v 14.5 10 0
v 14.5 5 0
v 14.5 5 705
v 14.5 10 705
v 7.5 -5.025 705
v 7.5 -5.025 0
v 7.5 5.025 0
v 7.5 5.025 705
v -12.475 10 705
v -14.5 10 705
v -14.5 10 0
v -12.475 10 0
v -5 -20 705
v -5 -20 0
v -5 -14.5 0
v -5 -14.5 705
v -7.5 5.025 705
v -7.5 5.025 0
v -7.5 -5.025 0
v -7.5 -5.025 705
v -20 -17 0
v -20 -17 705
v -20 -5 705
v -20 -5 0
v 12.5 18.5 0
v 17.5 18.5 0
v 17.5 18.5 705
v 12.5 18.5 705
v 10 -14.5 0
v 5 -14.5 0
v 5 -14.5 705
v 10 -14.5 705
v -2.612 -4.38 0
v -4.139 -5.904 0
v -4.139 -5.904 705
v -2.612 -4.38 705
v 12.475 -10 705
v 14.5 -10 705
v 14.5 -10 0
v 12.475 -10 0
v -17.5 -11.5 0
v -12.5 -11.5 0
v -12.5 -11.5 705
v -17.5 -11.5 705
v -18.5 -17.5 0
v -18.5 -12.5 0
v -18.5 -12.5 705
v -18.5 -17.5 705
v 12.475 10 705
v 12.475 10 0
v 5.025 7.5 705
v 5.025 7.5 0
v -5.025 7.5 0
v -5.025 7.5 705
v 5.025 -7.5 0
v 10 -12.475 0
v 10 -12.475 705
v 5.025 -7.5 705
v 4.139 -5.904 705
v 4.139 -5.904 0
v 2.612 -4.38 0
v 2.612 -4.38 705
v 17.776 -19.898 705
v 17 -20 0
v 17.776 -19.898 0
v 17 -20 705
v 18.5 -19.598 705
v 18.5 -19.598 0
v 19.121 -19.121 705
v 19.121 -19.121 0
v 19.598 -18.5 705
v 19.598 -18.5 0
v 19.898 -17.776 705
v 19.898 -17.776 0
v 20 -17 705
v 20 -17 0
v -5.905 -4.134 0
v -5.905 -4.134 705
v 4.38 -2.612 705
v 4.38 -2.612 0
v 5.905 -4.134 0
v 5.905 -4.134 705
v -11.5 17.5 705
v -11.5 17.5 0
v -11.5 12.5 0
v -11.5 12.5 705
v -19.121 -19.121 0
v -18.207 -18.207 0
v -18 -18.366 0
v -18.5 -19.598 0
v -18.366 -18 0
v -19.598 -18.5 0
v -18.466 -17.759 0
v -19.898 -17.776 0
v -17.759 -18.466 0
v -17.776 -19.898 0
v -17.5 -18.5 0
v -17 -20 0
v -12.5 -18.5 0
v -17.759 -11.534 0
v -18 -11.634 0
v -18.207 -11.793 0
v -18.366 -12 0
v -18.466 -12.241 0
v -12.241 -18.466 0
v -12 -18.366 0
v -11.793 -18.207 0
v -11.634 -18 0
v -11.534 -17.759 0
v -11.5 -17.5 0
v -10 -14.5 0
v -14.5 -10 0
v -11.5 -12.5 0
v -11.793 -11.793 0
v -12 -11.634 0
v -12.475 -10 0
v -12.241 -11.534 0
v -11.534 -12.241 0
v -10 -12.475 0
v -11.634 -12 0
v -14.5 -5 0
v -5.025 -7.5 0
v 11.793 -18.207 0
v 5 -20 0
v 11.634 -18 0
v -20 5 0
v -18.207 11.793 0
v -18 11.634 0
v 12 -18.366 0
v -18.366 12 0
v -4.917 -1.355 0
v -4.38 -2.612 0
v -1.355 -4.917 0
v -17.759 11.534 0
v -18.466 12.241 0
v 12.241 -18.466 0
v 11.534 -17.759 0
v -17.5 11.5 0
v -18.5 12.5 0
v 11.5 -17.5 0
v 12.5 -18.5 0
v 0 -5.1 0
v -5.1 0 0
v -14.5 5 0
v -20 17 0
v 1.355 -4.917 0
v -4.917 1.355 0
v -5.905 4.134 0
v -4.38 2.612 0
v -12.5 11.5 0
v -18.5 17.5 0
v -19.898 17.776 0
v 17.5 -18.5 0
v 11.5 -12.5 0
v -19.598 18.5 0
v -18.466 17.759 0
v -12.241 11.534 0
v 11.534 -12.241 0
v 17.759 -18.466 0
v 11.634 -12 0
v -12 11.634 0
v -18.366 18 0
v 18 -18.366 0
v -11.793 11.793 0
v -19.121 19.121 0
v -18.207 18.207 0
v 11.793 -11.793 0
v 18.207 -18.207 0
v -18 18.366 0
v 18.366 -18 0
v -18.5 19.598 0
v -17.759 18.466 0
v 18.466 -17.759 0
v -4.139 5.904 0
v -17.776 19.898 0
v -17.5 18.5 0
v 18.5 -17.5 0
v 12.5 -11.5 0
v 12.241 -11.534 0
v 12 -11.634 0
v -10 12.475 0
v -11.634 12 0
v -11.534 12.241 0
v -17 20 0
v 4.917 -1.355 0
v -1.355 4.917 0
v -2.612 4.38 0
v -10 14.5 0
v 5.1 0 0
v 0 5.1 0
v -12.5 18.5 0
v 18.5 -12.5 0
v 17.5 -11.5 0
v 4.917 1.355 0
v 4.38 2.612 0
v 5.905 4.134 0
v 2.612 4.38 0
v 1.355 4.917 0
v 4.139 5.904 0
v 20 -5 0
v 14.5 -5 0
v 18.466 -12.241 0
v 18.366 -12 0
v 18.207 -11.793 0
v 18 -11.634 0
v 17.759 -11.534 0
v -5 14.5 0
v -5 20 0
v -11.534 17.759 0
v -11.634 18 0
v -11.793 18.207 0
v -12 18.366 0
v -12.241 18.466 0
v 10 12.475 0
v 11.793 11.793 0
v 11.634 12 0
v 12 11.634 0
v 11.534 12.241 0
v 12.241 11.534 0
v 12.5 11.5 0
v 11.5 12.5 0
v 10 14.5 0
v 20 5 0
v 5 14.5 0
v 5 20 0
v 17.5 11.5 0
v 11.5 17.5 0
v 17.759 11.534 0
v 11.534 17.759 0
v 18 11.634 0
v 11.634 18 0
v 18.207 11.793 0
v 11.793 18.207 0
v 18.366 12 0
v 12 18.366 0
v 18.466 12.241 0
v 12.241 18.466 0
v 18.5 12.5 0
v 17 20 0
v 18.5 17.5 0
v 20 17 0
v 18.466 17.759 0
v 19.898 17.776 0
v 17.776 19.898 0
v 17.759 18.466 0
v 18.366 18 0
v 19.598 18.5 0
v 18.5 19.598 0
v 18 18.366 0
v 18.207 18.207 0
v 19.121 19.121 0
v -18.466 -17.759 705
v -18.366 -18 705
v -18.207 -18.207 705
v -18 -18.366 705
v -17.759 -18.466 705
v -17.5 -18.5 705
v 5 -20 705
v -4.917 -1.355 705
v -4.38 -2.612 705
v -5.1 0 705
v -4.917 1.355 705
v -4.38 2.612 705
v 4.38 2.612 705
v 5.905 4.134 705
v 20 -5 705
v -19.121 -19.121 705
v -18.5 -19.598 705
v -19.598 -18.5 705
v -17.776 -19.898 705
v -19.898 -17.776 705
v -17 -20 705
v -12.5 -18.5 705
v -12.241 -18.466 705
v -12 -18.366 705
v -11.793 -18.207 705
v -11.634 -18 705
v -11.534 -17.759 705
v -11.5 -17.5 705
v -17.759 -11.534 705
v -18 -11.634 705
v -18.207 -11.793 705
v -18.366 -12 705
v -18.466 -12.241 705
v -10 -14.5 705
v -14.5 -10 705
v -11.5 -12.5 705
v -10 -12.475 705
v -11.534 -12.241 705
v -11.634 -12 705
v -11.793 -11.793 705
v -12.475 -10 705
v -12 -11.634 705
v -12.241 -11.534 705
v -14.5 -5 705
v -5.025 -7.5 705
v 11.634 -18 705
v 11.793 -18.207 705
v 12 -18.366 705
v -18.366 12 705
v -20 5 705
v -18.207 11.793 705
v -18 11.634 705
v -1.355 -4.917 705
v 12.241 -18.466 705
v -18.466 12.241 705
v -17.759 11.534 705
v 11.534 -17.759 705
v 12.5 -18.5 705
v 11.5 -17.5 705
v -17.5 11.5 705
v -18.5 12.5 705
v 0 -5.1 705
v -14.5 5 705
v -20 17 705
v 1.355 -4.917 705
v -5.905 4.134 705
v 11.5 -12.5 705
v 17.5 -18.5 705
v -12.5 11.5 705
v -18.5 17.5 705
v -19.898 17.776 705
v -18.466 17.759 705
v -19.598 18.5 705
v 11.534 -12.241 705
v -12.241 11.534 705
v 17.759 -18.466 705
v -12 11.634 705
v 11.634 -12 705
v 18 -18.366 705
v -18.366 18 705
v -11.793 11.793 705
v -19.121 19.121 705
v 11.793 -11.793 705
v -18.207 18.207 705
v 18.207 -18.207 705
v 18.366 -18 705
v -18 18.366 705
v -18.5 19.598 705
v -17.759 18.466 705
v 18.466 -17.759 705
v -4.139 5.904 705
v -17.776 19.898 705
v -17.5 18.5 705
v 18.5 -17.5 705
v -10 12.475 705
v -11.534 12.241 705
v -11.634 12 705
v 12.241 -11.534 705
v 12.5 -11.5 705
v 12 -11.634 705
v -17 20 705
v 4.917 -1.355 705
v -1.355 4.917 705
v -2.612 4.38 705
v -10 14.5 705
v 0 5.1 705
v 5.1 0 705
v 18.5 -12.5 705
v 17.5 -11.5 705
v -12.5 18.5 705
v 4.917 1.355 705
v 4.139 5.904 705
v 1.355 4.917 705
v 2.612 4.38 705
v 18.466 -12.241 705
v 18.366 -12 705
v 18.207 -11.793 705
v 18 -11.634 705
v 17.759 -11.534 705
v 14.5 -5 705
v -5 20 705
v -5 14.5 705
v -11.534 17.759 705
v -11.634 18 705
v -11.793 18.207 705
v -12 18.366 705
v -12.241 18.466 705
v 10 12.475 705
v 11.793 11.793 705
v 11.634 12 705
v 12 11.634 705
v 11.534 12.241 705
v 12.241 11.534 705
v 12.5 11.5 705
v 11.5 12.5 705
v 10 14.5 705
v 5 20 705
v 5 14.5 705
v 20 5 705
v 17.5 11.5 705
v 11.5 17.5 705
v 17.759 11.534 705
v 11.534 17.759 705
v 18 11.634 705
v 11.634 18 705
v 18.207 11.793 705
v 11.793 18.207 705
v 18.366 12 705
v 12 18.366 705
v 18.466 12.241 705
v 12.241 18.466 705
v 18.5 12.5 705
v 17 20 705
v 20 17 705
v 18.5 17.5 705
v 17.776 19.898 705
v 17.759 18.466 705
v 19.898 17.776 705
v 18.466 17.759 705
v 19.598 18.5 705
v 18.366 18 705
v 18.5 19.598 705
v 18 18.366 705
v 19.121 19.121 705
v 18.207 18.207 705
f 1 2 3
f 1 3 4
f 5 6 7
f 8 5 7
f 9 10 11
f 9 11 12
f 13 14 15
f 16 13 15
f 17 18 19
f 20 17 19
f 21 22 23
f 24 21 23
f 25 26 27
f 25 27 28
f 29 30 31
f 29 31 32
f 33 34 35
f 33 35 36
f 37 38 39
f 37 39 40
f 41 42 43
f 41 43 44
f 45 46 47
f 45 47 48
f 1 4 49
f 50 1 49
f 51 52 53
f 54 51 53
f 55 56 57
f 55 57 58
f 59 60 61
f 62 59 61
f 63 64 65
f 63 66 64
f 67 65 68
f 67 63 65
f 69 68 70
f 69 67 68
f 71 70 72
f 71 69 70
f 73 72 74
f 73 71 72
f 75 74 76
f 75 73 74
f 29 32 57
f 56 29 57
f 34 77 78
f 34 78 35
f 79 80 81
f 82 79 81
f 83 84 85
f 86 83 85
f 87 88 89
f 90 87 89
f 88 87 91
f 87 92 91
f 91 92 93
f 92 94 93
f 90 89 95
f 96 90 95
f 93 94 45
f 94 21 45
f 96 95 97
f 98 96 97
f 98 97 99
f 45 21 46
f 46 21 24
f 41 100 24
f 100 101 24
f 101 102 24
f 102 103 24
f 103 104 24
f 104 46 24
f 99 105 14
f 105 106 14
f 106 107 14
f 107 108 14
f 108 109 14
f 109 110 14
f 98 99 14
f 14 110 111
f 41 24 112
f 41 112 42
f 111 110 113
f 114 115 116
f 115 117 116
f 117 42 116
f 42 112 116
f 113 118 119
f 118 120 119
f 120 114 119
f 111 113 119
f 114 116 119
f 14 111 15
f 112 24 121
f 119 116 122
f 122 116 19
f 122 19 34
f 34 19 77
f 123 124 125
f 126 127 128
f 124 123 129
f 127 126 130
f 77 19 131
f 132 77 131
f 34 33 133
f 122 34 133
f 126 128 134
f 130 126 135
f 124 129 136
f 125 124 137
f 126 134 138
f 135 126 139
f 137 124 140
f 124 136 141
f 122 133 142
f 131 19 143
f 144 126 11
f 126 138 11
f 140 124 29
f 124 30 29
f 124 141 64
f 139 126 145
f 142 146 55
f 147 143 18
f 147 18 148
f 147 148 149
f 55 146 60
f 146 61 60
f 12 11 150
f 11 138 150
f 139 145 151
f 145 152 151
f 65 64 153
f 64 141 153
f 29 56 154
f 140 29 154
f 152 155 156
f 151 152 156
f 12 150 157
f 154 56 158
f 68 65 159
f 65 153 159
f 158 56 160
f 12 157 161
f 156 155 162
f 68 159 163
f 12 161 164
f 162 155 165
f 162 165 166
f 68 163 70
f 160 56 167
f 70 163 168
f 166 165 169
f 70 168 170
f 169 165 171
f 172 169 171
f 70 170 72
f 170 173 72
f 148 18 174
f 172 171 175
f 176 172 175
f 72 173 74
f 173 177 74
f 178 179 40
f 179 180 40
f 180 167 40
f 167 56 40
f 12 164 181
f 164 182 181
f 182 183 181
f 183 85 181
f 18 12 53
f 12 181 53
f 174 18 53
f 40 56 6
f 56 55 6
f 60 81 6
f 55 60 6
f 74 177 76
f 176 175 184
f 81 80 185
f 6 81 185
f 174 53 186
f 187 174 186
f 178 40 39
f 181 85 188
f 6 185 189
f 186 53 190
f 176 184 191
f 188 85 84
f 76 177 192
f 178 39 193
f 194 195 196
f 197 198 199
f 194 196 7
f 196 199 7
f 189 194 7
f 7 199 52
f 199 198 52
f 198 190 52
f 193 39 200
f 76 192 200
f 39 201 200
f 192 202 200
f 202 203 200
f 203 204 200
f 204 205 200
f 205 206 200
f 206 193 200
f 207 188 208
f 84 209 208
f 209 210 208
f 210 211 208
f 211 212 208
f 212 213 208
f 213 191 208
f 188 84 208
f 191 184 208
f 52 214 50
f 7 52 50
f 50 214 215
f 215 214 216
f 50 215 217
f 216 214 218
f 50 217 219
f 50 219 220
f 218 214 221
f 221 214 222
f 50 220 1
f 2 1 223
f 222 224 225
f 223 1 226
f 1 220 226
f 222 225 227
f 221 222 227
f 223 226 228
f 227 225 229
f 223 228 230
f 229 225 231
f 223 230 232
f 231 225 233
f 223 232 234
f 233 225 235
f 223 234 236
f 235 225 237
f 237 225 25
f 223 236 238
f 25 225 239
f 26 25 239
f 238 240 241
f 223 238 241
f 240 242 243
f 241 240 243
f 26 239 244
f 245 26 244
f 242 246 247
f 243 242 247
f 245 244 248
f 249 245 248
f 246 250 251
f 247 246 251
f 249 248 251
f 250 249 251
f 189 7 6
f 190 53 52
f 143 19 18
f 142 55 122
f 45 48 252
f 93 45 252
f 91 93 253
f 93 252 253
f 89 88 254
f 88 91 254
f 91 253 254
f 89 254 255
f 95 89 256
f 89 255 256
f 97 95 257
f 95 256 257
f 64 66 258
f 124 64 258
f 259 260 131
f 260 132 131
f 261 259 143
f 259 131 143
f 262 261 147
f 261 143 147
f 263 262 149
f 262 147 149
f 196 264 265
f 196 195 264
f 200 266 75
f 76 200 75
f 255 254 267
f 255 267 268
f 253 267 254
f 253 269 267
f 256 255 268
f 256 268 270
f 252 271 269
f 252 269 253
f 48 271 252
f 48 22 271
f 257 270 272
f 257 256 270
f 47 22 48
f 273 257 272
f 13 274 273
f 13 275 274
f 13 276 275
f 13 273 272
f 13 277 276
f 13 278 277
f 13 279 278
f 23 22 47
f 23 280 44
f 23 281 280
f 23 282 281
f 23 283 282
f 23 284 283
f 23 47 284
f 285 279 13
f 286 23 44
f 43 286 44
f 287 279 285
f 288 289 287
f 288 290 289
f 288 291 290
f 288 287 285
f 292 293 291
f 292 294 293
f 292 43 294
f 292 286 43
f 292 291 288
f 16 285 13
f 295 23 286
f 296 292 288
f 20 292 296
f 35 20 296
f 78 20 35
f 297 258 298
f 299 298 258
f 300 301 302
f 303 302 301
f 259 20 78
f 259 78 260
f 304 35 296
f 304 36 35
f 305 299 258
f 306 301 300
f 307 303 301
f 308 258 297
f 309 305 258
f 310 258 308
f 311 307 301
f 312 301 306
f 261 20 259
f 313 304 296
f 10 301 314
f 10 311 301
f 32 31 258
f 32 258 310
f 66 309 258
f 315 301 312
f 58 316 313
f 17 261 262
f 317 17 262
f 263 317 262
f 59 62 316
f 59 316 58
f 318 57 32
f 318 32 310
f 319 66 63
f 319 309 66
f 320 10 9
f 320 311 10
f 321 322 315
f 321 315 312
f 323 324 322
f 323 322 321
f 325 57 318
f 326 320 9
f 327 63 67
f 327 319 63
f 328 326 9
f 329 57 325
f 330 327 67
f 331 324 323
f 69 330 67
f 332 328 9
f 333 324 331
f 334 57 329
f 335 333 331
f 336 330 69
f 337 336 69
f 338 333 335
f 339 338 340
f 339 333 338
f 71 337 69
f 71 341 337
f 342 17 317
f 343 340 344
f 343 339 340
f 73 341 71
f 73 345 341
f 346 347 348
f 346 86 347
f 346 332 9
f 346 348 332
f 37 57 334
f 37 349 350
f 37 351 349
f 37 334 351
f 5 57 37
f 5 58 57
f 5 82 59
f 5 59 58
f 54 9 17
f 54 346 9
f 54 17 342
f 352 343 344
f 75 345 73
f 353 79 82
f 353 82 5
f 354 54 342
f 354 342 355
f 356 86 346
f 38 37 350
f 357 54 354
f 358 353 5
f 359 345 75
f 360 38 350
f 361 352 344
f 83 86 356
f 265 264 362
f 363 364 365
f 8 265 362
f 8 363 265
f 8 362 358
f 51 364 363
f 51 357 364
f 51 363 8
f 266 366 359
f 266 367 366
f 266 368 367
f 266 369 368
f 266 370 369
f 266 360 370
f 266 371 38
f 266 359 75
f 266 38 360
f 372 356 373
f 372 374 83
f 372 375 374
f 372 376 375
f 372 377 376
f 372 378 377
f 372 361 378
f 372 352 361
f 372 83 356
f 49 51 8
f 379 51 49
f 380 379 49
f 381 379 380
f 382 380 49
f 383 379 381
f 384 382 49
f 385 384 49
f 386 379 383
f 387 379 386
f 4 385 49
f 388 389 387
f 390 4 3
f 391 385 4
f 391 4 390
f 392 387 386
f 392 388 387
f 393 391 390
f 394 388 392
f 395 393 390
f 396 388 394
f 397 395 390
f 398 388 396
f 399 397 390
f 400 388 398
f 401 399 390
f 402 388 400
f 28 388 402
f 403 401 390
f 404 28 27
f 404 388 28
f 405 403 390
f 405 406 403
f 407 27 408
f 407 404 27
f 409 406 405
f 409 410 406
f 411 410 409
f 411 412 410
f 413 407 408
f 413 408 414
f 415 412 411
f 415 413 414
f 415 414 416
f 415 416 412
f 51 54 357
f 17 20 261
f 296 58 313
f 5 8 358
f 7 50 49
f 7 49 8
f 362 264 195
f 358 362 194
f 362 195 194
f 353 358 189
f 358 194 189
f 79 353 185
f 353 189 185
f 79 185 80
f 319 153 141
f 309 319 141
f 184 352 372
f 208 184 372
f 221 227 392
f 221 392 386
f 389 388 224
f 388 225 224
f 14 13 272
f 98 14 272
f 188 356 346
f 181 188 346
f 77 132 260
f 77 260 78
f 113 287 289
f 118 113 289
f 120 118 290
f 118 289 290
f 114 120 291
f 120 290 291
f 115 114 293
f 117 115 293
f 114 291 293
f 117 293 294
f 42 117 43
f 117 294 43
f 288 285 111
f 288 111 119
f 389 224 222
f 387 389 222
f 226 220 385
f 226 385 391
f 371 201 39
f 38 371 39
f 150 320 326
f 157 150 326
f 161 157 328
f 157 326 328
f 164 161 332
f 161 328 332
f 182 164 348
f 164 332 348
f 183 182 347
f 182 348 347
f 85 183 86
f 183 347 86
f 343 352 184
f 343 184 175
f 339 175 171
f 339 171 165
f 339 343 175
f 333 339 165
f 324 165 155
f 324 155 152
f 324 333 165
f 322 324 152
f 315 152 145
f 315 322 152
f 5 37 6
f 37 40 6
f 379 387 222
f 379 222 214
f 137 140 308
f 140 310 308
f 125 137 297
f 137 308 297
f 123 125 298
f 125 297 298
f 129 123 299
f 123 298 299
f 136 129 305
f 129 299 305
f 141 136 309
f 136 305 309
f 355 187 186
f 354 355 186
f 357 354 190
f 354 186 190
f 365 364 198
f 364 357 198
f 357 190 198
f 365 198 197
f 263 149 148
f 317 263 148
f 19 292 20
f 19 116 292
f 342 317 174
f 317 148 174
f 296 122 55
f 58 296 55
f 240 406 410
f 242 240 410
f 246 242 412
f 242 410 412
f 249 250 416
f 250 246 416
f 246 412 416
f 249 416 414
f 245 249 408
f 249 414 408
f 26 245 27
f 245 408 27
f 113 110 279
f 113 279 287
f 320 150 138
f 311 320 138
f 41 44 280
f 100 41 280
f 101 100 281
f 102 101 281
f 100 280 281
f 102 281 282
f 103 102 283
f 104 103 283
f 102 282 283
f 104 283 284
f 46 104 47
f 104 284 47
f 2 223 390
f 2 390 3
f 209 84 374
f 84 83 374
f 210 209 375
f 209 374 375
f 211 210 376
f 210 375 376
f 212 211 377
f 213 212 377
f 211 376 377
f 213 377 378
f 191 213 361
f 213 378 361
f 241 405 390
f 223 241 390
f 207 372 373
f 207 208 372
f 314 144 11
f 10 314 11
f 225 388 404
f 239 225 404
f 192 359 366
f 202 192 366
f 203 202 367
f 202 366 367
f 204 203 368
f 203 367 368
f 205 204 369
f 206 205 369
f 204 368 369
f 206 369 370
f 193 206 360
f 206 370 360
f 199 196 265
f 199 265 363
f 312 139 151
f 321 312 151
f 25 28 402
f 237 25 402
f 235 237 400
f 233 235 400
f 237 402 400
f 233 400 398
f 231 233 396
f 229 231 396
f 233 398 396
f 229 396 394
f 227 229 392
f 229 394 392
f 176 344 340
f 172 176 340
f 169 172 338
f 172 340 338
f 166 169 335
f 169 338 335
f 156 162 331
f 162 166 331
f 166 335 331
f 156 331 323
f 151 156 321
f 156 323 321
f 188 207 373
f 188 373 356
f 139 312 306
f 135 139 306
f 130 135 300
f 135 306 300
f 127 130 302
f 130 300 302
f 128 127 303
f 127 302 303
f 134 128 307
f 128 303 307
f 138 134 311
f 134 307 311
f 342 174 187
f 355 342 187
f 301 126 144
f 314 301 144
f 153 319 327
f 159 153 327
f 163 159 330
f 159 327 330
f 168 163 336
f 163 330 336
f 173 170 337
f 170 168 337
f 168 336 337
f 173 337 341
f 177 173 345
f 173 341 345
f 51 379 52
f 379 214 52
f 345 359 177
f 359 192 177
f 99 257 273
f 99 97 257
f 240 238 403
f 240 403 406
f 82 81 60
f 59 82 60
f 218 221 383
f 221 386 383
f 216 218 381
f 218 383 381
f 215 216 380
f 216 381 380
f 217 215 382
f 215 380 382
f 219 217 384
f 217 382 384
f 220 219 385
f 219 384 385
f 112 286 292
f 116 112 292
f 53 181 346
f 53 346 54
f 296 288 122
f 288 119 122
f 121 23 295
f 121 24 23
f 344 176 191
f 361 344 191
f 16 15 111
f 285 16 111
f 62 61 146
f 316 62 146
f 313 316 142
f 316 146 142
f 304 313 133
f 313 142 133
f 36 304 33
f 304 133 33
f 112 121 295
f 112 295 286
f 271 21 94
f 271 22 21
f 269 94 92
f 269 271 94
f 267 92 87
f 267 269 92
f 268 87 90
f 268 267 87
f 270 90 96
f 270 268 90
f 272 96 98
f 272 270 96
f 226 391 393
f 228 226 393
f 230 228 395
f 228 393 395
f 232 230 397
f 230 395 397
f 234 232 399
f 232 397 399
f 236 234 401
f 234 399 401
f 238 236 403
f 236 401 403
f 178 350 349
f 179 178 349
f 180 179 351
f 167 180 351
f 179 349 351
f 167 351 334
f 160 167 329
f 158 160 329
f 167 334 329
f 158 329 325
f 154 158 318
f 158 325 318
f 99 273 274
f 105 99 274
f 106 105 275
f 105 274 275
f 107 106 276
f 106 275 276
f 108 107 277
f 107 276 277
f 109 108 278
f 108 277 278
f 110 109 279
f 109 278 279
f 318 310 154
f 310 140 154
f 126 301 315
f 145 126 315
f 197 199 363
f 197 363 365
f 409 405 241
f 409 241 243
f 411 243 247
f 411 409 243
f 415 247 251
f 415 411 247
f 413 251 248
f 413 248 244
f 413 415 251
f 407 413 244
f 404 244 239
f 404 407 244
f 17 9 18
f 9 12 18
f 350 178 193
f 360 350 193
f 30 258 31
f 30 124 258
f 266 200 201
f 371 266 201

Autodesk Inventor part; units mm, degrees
ref_plane "YZ Plane" through (0, 0, 0) normal (1, 0, 0) x (0, 1, 0)
ref_plane "XZ Plane" through (0, 0, 0) normal (0, 1, 0) x (-1, 0, 0)
ref_plane "XY Plane" through (0, 0, 0) normal (0, 0, 1) x (1, 0, 0)
sketch "T-Slot 4040 Base" plane through (0, 0, 0) normal (0, 0, 1) x (1, 0, 0)
  line L0 (-28, 0) -> (28, 0) construction
  line L1 (0, -28) -> (0, 28) construction
  circle A0 centre (0, 0) radius 5.1
  line L2 (-7.5, -7.5) -> (7.5, -7.5)
  line L3 (7.5, -7.5) -> (7.5, 7.5)
  line L4 (7.5, 7.5) -> (-7.5, 7.5)
  line L5 (-7.5, 7.5) -> (-7.5, -7.5)
  line L6 (-7.5, -7.5) -> (7.5, 7.5) construction
  line L7 (7.5, -7.5) -> (-7.5, 7.5) construction
  line L8 (-20, 20) -> (20, 20)
  line L9 (20, 20) -> (20, -20)
  line L10 (20, -20) -> (-20, -20)
  line L11 (-20, -20) -> (-20, 20)
  line L12 (-20, 20) -> (20, -20) construction
  line L13 (20, 20) -> (-20, -20) construction
  line L14 (20, 5) -> (14.5, 5)
  line L15 (14.5, 5) -> (14.5, 10)
  line L16 (14.5, 10) -> (12.4749, 10)
  line L17 (12.4749, 10) -> (7.5, 5.0251)
  line L18 (5, 20) -> (5, 14.5)
  line L19 (5, 14.5) -> (10, 14.5)
  line L20 (10, 14.5) -> (10, 12.4749)
  line L21 (10, 12.4749) -> (5.0251, 7.5)
  line L22 (18.5, 18.5) -> (11.5, 18.5)
  line L23 (11.5, 18.5) -> (11.5, 11.5)
  line L24 (11.5, 11.5) -> (18.5, 11.5)
  line L25 (18.5, 11.5) -> (18.5, 18.5)
  line L26 (18.5, 18.5) -> (11.5, 11.5) construction
  line L27 (11.5, 18.5) -> (18.5, 11.5) construction
  line L28 (3.0732, 1.3088) -> (4.38, 2.6125) construction
  line L29 (5.905, 4.1338) -> (4.1393, 5.9037)
  line L30 (4.1393, 5.9037) -> (2.6122, 4.3802)
  line L31 (1.3075, 3.0787) -> (3.0732, 1.3088) construction
  line L32 (3.0732, 1.3088) -> (4.1393, 5.9037) construction
  line L33 (5.905, 4.1338) -> (1.3075, 3.0787) construction
  line L34 (4.38, 2.6125) -> (5.905, 4.1338)
  line L35 (2.6122, 4.3802) -> (1.3075, 3.0787) construction
  line L36 (-20, 5) -> (-14.5, 5)
  line L37 (-14.5, 5) -> (-14.5, 10)
  line L38 (-14.5, 10) -> (-12.4749, 10)
  line L39 (-12.4749, 10) -> (-7.5, 5.0251)
  line L40 (-5, 20) -> (-5, 14.5)
  line L41 (-5, 14.5) -> (-10, 14.5)
  line L42 (-10, 14.5) -> (-10, 12.4749)
  line L43 (-10, 12.4749) -> (-5.0251, 7.5)
  line L44 (-18.5, 18.5) -> (-11.5, 18.5)
  line L45 (-11.5, 18.5) -> (-11.5, 11.5)
  line L46 (-11.5, 11.5) -> (-18.5, 11.5)
  line L47 (-18.5, 11.5) -> (-18.5, 18.5)
  line L48 (-5.905, 4.1338) -> (-4.1393, 5.9037)
  line L49 (-4.1393, 5.9037) -> (-2.6122, 4.3802)
  line L50 (-4.38, 2.6125) -> (-5.905, 4.1338)
  line L51 (7.5, -7.5) -> (-7.5, -7.5)
  line L52 (20, -5) -> (14.5, -5)
  line L53 (14.5, -5) -> (14.5, -10)
  line L54 (14.5, -10) -> (12.4749, -10)
  line L55 (12.4749, -10) -> (7.5, -5.0251)
  line L56 (5, -20) -> (5, -14.5)
  line L57 (5, -14.5) -> (10, -14.5)
  line L58 (10, -14.5) -> (10, -12.4749)
  line L59 (10, -12.4749) -> (5.0251, -7.5)
  line L60 (18.5, -18.5) -> (11.5, -18.5)
  line L61 (11.5, -18.5) -> (11.5, -11.5)
  line L62 (11.5, -11.5) -> (18.5, -11.5)
  line L63 (18.5, -11.5) -> (18.5, -18.5)
  line L64 (18.5, -18.5) -> (11.5, -11.5) construction
  line L65 (11.5, -18.5) -> (18.5, -11.5) construction
  line L66 (3.0732, -1.3088) -> (4.38, -2.6125) construction
  line L67 (5.905, -4.1338) -> (4.1393, -5.9037)
  line L68 (4.1393, -5.9037) -> (2.6122, -4.3802)
  line L69 (1.3075, -3.0787) -> (3.0732, -1.3088) construction
  line L70 (3.0732, -1.3088) -> (4.1393, -5.9037) construction
  line L71 (5.905, -4.1338) -> (1.3075, -3.0787) construction
  line L72 (4.38, -2.6125) -> (5.905, -4.1338)
  line L73 (2.6122, -4.3802) -> (1.3075, -3.0787) construction
  line L74 (-4.38, -2.6125) -> (-5.905, -4.1338)
  line L75 (-4.1393, -5.9037) -> (-2.6122, -4.3802)
  line L76 (-5.905, -4.1338) -> (-4.1393, -5.9037)
  line L77 (-12.4749, -10) -> (-7.5, -5.0251)
  line L78 (-10, -12.4749) -> (-5.0251, -7.5)
  line L79 (-10, -14.5) -> (-10, -12.4749)
  line L80 (-5, -14.5) -> (-10, -14.5)
  line L81 (-5, -20) -> (-5, -14.5)
  line L82 (-18.5, -18.5) -> (-11.5, -18.5)
  line L83 (-11.5, -18.5) -> (-11.5, -11.5)
  line L84 (-11.5, -11.5) -> (-18.5, -11.5)
  line L85 (-18.5, -11.5) -> (-18.5, -18.5)
  line L86 (-14.5, -10) -> (-12.4749, -10)
  line L87 (-14.5, -5) -> (-14.5, -10)
  line L88 (-20, -5) -> (-14.5, -5)
  point P0 (15, 15)
  point P1 (3.6062, 3.6062)
  point P2 (3.6062, 3.6062)
  point P3 (15, -15)
  point P4 (3.6062, -3.6062)
  point P5 (3.6062, -3.6062)
  dimension "d9" = 10.2
  dimension "d12" = 40
  dimension "d13" = 40
  dimension "d14" = 5.5
  dimension "d15" = 15
  dimension "d16" = 7
  dimension "d17" = 10
  dimension "d20" = 1.75
  dimension "d21" = 7
  dimension "d22" = 2
  dimension "d29" = 1.5
  dimension "d30" = 2.5
extrude "Extrusion1" add sketch "T-Slot 4040 Base" along normal blind 705 contours L5 L4 L3 L2 | L2 L78 L79 L80 L81 L10 L11 L88 L87 L86 L77 L5 | L2 L3 L55 L54 L53 L52 L9 L10 L56 L57 L58 L59 | L39 L38 L37 L36 L11 L8 L40 L41 L42 L43 L4 L5 | L3 L4 L21 L20 L19 L18 L8 L9 L14 L15 L16 L17
fillet "Rundung1" radius 1 16 edges at (11.5, 18.5, 352.5) (18.5, 18.5, 352.5) (18.5, 11.5, 352.5) (11.5, 11.5, 352.5) (-11.5, 18.5, 352.5) (-18.5, 18.5, 352.5) (-18.5, 11.5, 352.5) (-11.5, 11.5, 352.5) (-18.5, -11.5, 352.5) (-11.5, -11.5, 352.5) (-11.5, -18.5, 352.5) (-18.5, -18.5, 352.5) (11.5, -18.5, 352.5) (11.5, -11.5, 352.5) (18.5, -11.5, 352.5) (18.5, -18.5, 352.5)
fillet "Rundung2" radius 3 4 edges at (20, 20, 352.5) (20, -20, 352.5) (-20, -20, 352.5) (-20, 20, 352.5)
properties part number "T-SLOT 4040 B-Type 705mm"
